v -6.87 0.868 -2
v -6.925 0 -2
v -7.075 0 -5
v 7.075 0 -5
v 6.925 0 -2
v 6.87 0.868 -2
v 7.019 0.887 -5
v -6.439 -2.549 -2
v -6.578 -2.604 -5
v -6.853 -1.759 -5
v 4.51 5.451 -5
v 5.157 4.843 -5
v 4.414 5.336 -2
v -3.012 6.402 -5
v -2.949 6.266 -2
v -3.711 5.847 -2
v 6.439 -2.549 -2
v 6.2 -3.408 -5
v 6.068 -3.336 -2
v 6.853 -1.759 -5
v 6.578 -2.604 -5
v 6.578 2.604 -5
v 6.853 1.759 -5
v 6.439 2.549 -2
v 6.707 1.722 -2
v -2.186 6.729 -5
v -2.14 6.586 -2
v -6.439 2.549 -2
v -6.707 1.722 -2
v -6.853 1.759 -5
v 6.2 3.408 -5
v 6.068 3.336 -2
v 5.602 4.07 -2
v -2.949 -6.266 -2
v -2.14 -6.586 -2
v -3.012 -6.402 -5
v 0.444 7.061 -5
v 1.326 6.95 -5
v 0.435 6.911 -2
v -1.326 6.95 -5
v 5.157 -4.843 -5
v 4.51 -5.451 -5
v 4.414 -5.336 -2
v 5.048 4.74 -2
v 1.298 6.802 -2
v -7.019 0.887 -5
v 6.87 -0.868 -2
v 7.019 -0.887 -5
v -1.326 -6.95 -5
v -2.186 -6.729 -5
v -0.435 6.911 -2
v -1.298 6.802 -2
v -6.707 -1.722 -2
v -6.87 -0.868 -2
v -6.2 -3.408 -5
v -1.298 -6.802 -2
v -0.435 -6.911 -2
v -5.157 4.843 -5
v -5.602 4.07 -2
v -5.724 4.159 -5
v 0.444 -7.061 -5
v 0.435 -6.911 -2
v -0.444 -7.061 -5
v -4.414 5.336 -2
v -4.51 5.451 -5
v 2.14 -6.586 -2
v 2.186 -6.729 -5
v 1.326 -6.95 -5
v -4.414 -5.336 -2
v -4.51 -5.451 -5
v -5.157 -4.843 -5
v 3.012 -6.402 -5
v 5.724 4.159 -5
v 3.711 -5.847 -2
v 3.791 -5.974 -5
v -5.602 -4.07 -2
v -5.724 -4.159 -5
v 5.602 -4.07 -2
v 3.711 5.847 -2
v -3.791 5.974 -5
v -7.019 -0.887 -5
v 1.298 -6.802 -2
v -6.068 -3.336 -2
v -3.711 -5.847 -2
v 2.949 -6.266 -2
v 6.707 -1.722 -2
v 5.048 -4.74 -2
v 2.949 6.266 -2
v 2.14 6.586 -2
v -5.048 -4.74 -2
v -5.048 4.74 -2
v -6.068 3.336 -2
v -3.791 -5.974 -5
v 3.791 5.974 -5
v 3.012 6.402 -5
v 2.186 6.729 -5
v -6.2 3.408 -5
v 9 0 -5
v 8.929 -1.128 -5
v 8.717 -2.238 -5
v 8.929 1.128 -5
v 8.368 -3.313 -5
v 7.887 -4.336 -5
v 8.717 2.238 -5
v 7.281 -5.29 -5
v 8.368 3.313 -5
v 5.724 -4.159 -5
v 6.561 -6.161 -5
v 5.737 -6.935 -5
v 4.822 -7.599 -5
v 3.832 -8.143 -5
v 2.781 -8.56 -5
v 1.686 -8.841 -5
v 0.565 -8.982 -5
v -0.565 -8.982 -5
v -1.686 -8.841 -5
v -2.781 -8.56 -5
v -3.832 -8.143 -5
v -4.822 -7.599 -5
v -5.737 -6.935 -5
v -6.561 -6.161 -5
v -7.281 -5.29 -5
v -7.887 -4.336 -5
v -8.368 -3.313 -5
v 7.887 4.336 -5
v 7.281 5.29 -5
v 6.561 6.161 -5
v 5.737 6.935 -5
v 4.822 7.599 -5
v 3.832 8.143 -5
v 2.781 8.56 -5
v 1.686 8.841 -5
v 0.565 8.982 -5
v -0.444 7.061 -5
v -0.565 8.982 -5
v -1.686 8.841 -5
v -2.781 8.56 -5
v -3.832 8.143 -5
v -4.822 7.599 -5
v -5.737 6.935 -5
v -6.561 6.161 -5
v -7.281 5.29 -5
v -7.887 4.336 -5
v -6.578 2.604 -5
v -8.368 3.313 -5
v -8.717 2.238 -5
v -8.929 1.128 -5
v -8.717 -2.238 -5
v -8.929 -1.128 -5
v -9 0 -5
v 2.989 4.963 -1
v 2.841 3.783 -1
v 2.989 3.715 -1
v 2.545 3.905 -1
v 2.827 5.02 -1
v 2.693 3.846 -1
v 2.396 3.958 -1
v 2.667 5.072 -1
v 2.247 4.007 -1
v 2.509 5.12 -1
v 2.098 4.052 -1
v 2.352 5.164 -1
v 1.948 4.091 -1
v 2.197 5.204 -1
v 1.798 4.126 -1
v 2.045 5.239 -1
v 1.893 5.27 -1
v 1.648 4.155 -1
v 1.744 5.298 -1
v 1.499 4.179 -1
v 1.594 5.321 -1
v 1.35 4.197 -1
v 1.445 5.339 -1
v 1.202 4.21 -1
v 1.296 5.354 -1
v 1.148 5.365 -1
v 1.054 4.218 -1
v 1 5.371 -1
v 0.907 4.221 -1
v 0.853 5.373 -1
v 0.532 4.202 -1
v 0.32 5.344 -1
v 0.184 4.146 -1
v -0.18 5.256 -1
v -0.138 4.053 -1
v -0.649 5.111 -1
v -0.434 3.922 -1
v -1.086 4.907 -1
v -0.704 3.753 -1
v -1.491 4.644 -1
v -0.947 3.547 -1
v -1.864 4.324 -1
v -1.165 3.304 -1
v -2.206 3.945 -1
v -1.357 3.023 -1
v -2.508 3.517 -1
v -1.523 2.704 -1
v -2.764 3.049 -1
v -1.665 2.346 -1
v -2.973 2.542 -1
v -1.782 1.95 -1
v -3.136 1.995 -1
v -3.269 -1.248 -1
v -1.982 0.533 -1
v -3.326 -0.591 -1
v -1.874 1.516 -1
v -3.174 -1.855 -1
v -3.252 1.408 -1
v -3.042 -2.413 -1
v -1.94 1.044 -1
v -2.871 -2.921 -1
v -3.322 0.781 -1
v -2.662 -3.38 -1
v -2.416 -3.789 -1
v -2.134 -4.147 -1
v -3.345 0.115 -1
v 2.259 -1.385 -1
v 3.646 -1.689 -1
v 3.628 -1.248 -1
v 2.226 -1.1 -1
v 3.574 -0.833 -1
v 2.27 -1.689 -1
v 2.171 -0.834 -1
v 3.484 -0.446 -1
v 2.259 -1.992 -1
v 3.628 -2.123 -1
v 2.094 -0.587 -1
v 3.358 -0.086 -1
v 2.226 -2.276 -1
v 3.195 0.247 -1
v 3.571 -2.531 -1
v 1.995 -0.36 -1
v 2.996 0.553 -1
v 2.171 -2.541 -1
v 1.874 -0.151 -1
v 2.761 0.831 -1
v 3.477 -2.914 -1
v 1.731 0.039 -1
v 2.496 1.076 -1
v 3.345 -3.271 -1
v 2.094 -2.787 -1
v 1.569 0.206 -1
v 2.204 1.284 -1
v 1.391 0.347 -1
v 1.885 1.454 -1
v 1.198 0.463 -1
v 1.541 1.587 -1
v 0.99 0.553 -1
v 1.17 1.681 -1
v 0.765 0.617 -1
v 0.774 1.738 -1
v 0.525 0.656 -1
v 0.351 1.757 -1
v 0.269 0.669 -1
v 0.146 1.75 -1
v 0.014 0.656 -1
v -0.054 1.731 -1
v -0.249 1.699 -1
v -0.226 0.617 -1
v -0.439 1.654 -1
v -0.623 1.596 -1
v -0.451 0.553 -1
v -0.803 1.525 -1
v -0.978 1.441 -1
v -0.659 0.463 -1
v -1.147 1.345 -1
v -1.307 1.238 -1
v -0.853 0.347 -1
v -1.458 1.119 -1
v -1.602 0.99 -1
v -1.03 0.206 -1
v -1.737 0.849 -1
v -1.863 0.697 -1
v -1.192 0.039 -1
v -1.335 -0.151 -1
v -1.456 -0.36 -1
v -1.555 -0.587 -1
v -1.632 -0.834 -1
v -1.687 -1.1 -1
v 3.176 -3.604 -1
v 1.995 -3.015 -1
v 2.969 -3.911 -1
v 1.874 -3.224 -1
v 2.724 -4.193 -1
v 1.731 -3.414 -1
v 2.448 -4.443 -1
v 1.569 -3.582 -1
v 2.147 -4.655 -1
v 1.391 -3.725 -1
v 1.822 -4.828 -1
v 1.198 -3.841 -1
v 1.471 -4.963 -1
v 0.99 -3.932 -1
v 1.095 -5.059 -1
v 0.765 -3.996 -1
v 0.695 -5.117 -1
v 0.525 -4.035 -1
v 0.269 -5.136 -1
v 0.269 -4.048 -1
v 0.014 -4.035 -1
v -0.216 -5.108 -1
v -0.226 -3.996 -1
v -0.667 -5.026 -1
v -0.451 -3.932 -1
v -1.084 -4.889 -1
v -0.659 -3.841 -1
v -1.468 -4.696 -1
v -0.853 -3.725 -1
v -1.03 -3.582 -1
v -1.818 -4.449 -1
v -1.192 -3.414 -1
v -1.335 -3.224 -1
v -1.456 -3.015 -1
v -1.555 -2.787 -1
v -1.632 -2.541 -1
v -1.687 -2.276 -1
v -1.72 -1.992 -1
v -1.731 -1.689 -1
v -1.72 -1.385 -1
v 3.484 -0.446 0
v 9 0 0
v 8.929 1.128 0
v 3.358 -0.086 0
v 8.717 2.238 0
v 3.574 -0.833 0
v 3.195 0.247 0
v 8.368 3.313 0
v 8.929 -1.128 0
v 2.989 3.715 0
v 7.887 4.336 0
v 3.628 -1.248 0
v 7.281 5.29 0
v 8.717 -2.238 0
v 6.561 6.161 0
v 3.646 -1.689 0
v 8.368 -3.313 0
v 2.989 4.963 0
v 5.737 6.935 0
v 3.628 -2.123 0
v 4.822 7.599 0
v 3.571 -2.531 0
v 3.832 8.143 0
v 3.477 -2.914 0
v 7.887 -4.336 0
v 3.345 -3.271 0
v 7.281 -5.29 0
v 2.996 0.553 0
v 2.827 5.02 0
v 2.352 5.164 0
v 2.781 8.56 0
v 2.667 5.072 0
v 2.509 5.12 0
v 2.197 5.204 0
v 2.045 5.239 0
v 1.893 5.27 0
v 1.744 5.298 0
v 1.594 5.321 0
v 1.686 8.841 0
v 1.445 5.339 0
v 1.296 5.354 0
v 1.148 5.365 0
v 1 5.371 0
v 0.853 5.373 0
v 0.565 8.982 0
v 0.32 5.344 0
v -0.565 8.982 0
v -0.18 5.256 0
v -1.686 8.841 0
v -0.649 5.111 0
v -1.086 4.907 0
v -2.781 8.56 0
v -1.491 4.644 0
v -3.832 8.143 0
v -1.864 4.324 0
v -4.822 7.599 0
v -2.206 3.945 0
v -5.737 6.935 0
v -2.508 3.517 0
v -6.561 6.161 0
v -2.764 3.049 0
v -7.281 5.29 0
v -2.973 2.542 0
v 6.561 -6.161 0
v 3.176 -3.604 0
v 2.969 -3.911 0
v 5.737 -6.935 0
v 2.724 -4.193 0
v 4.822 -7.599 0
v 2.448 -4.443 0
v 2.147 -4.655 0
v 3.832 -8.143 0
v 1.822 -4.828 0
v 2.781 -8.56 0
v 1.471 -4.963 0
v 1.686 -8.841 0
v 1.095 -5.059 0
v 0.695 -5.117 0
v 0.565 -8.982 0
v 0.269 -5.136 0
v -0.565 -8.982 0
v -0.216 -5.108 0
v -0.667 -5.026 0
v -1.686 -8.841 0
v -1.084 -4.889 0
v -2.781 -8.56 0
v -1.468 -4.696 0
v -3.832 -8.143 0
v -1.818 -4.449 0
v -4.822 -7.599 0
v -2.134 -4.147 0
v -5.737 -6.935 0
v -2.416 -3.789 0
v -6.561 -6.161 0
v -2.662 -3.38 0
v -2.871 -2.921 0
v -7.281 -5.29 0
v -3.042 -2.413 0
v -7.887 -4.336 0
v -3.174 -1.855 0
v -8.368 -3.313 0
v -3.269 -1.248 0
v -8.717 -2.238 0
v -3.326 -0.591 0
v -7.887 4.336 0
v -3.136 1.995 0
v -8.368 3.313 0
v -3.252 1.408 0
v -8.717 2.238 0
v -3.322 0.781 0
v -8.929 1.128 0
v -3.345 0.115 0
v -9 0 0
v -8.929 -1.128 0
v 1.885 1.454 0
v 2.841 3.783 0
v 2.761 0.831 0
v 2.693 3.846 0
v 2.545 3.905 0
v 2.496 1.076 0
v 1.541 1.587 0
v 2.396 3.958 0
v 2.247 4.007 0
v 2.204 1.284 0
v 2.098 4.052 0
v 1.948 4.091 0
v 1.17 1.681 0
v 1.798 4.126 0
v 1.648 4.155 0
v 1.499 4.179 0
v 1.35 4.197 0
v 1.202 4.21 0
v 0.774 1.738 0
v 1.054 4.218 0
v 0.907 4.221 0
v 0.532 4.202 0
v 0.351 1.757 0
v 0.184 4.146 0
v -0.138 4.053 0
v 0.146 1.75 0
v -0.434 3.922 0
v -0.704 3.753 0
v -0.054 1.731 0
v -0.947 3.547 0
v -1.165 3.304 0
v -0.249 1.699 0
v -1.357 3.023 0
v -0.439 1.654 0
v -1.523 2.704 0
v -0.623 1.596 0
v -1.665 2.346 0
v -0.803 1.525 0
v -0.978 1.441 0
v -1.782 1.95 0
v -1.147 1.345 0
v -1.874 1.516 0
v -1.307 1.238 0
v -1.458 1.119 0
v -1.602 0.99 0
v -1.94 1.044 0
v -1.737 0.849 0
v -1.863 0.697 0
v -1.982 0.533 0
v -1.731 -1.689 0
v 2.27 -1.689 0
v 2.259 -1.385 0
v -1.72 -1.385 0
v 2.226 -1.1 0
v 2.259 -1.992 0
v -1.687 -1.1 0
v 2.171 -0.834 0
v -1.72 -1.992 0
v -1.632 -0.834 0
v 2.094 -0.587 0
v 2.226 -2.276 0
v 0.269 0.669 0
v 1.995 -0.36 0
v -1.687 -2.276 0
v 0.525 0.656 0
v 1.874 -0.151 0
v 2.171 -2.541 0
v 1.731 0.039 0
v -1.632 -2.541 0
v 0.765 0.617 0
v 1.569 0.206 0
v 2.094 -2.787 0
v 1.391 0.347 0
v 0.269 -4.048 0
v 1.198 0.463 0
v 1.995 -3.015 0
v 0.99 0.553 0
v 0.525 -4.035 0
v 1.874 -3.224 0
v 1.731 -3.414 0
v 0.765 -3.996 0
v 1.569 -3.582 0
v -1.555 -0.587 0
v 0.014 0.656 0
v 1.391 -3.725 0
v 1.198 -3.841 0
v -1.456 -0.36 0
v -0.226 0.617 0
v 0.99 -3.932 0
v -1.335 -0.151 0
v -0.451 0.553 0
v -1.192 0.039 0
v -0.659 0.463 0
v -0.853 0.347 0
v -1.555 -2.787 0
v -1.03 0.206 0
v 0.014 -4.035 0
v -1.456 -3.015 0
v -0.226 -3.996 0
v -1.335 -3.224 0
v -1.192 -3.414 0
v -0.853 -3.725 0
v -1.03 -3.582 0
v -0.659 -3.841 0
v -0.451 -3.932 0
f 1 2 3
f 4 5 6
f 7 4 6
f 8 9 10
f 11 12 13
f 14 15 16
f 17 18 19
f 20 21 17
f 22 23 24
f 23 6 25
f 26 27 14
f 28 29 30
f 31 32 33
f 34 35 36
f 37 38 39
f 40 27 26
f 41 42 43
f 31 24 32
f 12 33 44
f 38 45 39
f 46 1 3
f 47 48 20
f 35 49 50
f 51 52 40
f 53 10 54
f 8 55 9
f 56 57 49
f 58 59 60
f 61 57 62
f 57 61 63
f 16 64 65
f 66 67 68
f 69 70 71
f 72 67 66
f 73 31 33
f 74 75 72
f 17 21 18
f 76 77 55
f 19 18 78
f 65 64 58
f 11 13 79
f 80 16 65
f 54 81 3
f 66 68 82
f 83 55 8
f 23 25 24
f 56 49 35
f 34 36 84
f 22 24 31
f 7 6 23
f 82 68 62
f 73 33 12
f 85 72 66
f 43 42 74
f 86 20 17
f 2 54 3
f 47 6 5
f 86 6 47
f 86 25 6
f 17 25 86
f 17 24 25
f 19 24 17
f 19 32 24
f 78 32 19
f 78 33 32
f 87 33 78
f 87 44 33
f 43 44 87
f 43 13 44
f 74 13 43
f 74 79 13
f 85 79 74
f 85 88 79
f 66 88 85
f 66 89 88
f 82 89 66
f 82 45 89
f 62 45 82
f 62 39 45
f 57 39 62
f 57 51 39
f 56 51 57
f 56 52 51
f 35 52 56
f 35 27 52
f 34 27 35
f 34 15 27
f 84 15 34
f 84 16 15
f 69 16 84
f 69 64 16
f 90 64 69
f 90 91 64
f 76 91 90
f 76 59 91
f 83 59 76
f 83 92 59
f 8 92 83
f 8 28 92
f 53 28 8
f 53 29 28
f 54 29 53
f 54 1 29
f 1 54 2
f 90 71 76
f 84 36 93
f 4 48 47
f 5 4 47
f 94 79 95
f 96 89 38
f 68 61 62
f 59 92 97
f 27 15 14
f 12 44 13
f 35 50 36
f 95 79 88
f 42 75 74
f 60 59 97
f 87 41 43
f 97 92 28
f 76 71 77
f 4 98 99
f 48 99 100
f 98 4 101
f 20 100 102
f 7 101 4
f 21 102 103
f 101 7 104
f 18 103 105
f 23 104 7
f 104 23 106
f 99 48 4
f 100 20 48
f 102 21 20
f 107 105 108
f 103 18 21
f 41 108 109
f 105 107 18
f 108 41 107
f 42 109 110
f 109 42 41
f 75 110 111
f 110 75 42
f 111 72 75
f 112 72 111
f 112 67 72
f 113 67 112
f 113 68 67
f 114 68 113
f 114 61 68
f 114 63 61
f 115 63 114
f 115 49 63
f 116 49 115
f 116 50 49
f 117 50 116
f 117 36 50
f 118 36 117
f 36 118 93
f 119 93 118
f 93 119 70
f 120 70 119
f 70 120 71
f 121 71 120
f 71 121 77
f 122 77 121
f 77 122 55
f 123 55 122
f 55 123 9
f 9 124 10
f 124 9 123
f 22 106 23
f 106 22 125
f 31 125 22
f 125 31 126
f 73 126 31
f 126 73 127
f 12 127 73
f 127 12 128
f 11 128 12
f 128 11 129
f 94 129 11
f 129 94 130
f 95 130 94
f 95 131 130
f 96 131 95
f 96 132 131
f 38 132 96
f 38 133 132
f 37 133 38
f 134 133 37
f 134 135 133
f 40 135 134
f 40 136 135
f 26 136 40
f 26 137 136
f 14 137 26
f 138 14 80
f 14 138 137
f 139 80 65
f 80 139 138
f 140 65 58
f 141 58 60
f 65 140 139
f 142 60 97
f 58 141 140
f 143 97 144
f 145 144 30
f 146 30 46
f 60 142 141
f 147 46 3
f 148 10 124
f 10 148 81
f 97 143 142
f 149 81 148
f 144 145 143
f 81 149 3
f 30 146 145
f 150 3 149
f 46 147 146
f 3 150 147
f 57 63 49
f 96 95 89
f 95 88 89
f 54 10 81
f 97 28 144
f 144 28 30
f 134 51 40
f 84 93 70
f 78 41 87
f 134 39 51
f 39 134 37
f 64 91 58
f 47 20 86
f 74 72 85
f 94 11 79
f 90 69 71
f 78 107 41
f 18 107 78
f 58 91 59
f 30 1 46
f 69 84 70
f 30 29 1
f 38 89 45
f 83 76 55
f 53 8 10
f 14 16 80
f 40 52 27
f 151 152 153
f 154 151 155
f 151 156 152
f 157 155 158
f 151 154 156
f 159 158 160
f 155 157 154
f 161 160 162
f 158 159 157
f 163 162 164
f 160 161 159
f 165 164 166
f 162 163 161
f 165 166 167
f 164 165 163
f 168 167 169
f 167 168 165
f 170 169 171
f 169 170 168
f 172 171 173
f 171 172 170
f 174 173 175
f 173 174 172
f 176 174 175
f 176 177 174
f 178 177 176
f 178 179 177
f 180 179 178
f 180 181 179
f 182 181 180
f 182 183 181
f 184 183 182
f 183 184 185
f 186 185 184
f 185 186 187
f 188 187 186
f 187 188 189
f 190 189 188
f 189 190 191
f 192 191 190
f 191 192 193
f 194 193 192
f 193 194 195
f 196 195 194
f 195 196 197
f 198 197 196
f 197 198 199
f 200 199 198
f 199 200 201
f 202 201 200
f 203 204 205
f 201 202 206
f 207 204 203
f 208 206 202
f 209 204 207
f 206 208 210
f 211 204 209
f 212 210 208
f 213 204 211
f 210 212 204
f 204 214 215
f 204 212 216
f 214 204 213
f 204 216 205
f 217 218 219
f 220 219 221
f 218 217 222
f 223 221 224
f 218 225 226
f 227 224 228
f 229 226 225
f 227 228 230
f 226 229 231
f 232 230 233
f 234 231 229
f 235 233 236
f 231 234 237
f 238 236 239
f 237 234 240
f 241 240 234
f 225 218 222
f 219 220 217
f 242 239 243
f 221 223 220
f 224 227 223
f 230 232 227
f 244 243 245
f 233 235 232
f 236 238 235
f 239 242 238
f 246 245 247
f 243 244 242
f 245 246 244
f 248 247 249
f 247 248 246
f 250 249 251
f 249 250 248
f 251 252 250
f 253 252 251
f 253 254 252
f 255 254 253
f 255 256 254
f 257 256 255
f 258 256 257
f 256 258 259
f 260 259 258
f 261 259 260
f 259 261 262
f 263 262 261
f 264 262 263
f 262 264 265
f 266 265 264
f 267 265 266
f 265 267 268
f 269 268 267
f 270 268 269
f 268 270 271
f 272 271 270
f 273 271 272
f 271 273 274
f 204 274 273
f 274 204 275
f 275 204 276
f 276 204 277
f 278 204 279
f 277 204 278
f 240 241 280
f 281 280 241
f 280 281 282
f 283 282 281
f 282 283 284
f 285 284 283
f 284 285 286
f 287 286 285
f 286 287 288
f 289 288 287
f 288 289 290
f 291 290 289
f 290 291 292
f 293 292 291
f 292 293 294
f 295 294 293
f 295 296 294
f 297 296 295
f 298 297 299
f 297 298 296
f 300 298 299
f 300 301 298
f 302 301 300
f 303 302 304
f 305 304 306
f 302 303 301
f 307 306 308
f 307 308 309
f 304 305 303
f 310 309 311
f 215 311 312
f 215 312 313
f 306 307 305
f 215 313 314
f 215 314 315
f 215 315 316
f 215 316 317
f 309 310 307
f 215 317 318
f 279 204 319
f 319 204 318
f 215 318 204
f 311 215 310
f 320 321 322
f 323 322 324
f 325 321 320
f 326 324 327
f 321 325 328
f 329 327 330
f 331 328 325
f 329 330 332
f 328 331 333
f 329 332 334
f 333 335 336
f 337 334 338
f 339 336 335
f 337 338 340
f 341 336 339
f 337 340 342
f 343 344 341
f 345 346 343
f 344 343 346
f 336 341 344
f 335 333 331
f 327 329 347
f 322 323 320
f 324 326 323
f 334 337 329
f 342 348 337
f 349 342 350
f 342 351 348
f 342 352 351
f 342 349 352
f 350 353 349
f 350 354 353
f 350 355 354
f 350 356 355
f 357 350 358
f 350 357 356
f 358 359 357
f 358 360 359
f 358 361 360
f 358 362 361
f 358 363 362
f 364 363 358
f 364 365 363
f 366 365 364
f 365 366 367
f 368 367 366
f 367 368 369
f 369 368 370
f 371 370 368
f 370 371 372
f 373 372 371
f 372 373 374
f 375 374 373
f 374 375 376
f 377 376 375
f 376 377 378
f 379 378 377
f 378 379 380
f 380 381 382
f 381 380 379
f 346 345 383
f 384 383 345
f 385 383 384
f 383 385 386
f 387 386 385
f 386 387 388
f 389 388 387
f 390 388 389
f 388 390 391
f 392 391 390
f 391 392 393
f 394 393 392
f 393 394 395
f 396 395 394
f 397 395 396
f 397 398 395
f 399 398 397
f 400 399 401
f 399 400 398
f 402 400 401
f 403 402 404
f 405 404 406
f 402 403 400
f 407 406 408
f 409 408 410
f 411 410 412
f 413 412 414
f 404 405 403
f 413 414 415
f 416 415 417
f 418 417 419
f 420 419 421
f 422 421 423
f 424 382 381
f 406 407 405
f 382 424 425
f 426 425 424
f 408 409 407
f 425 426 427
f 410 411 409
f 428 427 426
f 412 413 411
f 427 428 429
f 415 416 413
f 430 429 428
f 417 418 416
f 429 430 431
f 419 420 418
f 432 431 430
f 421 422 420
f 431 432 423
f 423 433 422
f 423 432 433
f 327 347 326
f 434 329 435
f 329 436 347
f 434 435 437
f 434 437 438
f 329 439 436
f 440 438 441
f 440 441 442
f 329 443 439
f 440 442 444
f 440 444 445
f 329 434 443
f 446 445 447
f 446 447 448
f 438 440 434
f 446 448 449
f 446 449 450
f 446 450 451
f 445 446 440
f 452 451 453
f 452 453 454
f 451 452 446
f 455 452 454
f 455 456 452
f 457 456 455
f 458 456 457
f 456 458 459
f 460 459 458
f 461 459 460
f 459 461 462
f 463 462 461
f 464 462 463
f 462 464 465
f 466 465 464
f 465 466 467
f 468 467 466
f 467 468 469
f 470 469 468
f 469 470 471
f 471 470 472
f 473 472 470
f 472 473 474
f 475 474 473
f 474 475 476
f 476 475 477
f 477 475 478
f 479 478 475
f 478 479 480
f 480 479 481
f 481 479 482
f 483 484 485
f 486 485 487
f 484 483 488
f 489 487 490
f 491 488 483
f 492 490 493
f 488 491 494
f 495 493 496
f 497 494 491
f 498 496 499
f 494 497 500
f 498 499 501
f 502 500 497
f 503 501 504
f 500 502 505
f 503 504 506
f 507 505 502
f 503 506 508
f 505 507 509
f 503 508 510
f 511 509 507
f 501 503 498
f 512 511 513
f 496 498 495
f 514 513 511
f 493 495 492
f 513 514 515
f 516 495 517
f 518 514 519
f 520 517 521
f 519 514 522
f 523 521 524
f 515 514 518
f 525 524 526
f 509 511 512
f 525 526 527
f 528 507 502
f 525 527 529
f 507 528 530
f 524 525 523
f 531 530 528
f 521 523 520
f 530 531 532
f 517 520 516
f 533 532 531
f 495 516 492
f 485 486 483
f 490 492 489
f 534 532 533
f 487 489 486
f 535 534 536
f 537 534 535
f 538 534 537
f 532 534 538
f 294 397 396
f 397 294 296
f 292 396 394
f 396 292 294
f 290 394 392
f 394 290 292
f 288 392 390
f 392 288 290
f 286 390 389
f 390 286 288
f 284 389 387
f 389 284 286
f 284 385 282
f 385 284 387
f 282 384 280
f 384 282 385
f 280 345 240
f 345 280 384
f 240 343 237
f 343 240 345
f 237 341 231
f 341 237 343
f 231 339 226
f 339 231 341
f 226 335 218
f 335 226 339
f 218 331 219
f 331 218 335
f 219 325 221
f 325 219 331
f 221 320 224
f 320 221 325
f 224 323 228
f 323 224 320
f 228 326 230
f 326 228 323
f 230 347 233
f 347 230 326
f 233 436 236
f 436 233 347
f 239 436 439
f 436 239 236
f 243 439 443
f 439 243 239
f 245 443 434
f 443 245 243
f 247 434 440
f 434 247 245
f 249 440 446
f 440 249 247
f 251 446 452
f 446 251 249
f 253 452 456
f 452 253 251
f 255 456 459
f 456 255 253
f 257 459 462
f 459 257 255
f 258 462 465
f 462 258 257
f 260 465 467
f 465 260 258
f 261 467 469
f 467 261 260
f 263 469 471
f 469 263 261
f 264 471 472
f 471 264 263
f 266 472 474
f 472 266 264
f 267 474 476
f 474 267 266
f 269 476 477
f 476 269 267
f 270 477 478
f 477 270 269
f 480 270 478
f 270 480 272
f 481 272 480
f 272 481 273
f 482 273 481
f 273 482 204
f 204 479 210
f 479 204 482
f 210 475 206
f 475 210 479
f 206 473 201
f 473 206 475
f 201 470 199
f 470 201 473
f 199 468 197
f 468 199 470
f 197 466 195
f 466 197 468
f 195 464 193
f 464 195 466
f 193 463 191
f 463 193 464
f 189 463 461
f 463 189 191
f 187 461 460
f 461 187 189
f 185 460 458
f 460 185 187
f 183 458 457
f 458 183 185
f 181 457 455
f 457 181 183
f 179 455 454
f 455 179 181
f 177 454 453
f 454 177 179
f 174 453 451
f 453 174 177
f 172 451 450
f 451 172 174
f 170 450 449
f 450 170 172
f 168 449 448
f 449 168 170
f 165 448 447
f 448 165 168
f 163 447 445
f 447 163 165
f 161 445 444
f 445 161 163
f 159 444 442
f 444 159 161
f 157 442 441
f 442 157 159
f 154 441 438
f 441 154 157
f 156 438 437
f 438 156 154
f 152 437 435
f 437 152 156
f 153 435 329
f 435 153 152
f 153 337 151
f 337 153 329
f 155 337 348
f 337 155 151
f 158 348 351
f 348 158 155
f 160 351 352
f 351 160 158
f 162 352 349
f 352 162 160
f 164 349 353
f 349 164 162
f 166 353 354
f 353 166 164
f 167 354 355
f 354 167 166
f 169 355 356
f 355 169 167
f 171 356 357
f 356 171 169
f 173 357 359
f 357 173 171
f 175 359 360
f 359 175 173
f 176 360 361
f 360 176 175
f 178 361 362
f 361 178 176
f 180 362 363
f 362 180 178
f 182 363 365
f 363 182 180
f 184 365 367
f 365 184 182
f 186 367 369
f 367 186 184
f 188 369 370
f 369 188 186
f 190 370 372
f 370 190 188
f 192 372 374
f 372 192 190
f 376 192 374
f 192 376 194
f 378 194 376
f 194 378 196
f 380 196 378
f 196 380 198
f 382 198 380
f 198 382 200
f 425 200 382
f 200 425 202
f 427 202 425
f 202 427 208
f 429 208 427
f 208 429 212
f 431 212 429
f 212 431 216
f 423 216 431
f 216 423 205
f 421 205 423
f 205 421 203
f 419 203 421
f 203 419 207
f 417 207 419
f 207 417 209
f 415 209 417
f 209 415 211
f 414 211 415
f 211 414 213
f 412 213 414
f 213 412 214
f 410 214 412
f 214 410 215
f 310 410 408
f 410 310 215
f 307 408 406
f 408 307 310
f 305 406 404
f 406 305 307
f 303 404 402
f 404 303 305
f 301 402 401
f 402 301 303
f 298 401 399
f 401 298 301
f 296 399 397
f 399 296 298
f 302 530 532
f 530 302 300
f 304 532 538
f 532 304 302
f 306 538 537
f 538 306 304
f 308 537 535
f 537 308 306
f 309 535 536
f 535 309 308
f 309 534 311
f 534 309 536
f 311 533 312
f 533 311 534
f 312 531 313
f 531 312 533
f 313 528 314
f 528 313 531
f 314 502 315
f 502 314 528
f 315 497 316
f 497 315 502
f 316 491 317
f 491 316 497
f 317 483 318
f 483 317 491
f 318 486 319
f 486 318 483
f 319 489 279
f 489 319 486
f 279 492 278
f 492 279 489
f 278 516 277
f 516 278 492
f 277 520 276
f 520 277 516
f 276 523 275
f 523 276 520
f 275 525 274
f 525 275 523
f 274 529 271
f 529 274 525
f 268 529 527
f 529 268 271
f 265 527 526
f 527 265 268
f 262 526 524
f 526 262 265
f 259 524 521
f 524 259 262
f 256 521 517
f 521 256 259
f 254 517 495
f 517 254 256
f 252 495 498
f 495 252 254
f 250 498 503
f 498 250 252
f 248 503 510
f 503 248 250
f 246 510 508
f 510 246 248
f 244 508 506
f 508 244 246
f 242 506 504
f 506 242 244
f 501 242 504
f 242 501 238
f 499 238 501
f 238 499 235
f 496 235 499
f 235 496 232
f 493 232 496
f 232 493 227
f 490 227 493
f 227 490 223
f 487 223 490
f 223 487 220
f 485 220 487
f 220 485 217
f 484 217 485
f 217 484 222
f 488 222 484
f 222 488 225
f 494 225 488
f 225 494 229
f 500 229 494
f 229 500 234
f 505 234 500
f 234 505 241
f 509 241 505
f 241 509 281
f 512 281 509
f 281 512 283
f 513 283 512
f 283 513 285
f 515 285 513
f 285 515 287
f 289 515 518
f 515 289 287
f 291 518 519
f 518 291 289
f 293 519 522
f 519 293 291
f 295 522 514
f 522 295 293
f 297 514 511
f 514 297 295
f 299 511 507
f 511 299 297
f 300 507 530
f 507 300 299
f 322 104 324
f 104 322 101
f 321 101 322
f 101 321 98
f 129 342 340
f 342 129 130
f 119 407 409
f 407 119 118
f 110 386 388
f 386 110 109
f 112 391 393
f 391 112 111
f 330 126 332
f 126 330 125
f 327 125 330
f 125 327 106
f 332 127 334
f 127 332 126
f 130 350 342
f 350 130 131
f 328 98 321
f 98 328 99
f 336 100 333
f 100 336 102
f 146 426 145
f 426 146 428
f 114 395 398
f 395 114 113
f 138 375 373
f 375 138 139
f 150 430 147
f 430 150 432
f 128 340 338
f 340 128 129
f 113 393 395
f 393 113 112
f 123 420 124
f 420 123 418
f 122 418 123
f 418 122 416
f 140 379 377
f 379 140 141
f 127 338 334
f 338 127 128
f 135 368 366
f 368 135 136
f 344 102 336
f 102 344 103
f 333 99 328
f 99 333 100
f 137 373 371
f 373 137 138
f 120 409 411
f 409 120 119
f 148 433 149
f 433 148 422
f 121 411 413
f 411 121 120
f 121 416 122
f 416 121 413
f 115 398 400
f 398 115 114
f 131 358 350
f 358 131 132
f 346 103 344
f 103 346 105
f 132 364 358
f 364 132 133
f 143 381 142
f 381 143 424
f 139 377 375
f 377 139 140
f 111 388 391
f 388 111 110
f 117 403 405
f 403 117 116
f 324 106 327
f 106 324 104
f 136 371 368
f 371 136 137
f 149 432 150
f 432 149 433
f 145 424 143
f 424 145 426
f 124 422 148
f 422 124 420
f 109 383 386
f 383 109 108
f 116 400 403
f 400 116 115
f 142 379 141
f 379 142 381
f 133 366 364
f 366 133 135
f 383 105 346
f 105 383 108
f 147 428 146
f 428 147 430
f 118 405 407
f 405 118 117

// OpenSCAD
$fn = 50;


difference() {
	union() {
		translate(v = [0, 0, -5.0000000000]) {
			cylinder(h = 5, r = 9.0000000000);
		}
	}
	union() {
		#translate(v = [0, 0, -5.0000000000]) {
			cylinder(h = 3, r1 = 7.0750000000, r2 = 6.9250000000);
		}
		translate(v = [0, 0, -1]) {
			linear_extrude(height = 1) {
				text(font = "Impact", halign = "center", size = 10, text = "6", valign = "center");
			}
		}
	}
}
